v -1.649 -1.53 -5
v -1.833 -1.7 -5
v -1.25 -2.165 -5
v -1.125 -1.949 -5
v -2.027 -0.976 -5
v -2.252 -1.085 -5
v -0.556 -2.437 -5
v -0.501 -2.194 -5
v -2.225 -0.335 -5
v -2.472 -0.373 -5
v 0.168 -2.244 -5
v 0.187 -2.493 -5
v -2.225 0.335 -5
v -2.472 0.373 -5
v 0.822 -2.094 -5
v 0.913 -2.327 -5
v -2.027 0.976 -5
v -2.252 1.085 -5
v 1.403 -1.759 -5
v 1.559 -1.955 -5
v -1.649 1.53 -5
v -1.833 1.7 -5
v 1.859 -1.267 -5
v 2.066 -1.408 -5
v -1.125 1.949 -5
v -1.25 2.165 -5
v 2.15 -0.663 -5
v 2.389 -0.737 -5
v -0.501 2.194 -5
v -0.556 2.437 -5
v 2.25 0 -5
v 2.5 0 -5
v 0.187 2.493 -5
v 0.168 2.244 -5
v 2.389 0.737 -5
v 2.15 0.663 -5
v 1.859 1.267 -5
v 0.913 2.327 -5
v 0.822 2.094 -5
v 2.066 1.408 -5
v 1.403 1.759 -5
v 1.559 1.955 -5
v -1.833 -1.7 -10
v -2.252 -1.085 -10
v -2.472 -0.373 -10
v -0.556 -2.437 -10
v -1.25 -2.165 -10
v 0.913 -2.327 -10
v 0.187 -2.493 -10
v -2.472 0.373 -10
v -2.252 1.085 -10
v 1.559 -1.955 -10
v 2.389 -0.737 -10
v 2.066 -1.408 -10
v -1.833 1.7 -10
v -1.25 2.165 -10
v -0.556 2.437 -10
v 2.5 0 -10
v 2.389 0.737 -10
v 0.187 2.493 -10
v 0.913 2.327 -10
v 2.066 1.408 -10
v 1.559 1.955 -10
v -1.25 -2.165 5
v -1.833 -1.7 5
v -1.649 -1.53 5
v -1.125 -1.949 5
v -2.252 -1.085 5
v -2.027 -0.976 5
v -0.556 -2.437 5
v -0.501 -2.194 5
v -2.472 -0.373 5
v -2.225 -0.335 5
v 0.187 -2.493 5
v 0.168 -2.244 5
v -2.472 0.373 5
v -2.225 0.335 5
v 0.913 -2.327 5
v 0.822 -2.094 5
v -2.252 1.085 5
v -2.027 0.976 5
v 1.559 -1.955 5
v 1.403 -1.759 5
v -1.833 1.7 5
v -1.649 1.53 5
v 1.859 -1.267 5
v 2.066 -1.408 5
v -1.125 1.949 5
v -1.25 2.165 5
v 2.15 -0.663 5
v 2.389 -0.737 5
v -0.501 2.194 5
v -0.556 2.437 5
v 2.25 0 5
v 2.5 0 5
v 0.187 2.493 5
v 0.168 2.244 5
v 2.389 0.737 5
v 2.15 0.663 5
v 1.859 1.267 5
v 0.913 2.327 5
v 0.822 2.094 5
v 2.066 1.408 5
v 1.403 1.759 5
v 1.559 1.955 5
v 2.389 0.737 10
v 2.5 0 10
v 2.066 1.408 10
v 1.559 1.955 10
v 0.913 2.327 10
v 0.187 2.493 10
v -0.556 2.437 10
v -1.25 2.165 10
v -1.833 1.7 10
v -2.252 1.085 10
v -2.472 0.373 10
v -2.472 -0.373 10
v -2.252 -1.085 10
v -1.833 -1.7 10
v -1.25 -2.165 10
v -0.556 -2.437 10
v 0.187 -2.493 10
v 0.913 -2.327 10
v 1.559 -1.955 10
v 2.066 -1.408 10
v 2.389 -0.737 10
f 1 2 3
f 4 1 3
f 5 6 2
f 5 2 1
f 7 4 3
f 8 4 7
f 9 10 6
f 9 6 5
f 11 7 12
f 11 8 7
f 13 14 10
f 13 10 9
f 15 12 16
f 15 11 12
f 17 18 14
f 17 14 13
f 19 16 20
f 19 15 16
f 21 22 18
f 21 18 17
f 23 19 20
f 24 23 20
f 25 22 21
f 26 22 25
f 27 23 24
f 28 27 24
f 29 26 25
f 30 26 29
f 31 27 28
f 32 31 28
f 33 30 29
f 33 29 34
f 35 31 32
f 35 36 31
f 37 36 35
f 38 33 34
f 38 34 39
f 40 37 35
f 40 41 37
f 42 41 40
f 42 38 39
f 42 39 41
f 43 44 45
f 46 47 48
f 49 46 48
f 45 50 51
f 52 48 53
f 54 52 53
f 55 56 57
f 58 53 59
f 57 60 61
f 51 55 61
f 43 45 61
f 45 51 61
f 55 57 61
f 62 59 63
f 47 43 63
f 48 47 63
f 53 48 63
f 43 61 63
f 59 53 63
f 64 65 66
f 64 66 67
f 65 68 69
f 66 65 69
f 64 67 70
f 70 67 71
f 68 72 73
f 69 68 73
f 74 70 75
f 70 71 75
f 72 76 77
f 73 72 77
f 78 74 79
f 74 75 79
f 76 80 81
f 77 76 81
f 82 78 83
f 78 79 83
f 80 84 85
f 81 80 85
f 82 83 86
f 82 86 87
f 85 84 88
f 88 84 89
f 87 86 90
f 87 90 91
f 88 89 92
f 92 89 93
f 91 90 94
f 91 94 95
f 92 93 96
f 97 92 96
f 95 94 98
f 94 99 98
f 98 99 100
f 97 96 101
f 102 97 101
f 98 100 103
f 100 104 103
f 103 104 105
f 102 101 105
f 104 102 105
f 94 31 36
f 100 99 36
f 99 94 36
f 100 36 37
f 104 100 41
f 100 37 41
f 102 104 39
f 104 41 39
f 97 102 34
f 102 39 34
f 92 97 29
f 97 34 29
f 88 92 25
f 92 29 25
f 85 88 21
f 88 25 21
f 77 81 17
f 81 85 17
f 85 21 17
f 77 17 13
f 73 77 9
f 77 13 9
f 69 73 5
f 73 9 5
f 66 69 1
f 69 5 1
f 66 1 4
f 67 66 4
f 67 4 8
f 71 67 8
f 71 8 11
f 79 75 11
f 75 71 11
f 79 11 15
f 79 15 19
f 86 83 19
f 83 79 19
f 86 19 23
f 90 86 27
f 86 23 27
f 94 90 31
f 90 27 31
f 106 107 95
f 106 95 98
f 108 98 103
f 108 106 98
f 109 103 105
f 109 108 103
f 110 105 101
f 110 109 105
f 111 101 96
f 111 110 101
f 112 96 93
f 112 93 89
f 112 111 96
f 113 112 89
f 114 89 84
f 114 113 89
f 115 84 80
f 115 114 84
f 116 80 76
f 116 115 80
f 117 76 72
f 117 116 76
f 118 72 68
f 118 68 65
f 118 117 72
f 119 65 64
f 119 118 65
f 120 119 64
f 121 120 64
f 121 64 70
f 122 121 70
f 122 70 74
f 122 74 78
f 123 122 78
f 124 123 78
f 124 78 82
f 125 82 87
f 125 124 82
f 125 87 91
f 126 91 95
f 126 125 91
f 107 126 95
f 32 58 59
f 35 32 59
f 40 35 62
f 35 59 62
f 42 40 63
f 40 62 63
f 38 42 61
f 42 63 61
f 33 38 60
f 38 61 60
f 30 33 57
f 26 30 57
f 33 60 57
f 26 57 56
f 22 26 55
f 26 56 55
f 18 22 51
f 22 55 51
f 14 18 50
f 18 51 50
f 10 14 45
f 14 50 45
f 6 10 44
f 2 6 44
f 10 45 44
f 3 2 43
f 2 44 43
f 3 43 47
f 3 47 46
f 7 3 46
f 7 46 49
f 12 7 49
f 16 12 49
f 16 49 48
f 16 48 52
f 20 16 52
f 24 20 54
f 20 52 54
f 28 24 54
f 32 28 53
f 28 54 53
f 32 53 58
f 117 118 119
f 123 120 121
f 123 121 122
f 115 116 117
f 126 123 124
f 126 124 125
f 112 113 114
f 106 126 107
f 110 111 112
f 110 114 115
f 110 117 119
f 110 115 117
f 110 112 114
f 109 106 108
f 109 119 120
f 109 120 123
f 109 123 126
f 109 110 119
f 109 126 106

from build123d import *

# Parameters (mm, degrees)
EXTRUDE_START        = 10
SKETCH_1_R           = 2.5
EXTRUDE_1_DEPTH      = 5
EXTRUDE_2_DEPTH      = 6
EXTRUDE_2_DEPTH_BACK = 6
SKETCH_2_R           = 2.25


with BuildPart() as part:
    # Эскиз1 → Бобышка-Вытянуть1 (new body)
    with BuildSketch(Plane.XY.offset(EXTRUDE_START)):
        Circle(SKETCH_1_R)
    extrude_1 = extrude(amount=-EXTRUDE_1_DEPTH)

    # Эскиз2 → Бобышка-Вытянуть2 (add, two sides: drawn at the far end of the back side and taken through both)
    with BuildSketch(Plane.XY.offset(-EXTRUDE_2_DEPTH_BACK)):
        Circle(SKETCH_2_R)
    extrude(amount=EXTRUDE_2_DEPTH + EXTRUDE_2_DEPTH_BACK)

    # Зеркальное отражение1: Бобышка-Вытянуть1 across plane
    add(extrude_1.mirror(Plane.XY))


solid = part.part
